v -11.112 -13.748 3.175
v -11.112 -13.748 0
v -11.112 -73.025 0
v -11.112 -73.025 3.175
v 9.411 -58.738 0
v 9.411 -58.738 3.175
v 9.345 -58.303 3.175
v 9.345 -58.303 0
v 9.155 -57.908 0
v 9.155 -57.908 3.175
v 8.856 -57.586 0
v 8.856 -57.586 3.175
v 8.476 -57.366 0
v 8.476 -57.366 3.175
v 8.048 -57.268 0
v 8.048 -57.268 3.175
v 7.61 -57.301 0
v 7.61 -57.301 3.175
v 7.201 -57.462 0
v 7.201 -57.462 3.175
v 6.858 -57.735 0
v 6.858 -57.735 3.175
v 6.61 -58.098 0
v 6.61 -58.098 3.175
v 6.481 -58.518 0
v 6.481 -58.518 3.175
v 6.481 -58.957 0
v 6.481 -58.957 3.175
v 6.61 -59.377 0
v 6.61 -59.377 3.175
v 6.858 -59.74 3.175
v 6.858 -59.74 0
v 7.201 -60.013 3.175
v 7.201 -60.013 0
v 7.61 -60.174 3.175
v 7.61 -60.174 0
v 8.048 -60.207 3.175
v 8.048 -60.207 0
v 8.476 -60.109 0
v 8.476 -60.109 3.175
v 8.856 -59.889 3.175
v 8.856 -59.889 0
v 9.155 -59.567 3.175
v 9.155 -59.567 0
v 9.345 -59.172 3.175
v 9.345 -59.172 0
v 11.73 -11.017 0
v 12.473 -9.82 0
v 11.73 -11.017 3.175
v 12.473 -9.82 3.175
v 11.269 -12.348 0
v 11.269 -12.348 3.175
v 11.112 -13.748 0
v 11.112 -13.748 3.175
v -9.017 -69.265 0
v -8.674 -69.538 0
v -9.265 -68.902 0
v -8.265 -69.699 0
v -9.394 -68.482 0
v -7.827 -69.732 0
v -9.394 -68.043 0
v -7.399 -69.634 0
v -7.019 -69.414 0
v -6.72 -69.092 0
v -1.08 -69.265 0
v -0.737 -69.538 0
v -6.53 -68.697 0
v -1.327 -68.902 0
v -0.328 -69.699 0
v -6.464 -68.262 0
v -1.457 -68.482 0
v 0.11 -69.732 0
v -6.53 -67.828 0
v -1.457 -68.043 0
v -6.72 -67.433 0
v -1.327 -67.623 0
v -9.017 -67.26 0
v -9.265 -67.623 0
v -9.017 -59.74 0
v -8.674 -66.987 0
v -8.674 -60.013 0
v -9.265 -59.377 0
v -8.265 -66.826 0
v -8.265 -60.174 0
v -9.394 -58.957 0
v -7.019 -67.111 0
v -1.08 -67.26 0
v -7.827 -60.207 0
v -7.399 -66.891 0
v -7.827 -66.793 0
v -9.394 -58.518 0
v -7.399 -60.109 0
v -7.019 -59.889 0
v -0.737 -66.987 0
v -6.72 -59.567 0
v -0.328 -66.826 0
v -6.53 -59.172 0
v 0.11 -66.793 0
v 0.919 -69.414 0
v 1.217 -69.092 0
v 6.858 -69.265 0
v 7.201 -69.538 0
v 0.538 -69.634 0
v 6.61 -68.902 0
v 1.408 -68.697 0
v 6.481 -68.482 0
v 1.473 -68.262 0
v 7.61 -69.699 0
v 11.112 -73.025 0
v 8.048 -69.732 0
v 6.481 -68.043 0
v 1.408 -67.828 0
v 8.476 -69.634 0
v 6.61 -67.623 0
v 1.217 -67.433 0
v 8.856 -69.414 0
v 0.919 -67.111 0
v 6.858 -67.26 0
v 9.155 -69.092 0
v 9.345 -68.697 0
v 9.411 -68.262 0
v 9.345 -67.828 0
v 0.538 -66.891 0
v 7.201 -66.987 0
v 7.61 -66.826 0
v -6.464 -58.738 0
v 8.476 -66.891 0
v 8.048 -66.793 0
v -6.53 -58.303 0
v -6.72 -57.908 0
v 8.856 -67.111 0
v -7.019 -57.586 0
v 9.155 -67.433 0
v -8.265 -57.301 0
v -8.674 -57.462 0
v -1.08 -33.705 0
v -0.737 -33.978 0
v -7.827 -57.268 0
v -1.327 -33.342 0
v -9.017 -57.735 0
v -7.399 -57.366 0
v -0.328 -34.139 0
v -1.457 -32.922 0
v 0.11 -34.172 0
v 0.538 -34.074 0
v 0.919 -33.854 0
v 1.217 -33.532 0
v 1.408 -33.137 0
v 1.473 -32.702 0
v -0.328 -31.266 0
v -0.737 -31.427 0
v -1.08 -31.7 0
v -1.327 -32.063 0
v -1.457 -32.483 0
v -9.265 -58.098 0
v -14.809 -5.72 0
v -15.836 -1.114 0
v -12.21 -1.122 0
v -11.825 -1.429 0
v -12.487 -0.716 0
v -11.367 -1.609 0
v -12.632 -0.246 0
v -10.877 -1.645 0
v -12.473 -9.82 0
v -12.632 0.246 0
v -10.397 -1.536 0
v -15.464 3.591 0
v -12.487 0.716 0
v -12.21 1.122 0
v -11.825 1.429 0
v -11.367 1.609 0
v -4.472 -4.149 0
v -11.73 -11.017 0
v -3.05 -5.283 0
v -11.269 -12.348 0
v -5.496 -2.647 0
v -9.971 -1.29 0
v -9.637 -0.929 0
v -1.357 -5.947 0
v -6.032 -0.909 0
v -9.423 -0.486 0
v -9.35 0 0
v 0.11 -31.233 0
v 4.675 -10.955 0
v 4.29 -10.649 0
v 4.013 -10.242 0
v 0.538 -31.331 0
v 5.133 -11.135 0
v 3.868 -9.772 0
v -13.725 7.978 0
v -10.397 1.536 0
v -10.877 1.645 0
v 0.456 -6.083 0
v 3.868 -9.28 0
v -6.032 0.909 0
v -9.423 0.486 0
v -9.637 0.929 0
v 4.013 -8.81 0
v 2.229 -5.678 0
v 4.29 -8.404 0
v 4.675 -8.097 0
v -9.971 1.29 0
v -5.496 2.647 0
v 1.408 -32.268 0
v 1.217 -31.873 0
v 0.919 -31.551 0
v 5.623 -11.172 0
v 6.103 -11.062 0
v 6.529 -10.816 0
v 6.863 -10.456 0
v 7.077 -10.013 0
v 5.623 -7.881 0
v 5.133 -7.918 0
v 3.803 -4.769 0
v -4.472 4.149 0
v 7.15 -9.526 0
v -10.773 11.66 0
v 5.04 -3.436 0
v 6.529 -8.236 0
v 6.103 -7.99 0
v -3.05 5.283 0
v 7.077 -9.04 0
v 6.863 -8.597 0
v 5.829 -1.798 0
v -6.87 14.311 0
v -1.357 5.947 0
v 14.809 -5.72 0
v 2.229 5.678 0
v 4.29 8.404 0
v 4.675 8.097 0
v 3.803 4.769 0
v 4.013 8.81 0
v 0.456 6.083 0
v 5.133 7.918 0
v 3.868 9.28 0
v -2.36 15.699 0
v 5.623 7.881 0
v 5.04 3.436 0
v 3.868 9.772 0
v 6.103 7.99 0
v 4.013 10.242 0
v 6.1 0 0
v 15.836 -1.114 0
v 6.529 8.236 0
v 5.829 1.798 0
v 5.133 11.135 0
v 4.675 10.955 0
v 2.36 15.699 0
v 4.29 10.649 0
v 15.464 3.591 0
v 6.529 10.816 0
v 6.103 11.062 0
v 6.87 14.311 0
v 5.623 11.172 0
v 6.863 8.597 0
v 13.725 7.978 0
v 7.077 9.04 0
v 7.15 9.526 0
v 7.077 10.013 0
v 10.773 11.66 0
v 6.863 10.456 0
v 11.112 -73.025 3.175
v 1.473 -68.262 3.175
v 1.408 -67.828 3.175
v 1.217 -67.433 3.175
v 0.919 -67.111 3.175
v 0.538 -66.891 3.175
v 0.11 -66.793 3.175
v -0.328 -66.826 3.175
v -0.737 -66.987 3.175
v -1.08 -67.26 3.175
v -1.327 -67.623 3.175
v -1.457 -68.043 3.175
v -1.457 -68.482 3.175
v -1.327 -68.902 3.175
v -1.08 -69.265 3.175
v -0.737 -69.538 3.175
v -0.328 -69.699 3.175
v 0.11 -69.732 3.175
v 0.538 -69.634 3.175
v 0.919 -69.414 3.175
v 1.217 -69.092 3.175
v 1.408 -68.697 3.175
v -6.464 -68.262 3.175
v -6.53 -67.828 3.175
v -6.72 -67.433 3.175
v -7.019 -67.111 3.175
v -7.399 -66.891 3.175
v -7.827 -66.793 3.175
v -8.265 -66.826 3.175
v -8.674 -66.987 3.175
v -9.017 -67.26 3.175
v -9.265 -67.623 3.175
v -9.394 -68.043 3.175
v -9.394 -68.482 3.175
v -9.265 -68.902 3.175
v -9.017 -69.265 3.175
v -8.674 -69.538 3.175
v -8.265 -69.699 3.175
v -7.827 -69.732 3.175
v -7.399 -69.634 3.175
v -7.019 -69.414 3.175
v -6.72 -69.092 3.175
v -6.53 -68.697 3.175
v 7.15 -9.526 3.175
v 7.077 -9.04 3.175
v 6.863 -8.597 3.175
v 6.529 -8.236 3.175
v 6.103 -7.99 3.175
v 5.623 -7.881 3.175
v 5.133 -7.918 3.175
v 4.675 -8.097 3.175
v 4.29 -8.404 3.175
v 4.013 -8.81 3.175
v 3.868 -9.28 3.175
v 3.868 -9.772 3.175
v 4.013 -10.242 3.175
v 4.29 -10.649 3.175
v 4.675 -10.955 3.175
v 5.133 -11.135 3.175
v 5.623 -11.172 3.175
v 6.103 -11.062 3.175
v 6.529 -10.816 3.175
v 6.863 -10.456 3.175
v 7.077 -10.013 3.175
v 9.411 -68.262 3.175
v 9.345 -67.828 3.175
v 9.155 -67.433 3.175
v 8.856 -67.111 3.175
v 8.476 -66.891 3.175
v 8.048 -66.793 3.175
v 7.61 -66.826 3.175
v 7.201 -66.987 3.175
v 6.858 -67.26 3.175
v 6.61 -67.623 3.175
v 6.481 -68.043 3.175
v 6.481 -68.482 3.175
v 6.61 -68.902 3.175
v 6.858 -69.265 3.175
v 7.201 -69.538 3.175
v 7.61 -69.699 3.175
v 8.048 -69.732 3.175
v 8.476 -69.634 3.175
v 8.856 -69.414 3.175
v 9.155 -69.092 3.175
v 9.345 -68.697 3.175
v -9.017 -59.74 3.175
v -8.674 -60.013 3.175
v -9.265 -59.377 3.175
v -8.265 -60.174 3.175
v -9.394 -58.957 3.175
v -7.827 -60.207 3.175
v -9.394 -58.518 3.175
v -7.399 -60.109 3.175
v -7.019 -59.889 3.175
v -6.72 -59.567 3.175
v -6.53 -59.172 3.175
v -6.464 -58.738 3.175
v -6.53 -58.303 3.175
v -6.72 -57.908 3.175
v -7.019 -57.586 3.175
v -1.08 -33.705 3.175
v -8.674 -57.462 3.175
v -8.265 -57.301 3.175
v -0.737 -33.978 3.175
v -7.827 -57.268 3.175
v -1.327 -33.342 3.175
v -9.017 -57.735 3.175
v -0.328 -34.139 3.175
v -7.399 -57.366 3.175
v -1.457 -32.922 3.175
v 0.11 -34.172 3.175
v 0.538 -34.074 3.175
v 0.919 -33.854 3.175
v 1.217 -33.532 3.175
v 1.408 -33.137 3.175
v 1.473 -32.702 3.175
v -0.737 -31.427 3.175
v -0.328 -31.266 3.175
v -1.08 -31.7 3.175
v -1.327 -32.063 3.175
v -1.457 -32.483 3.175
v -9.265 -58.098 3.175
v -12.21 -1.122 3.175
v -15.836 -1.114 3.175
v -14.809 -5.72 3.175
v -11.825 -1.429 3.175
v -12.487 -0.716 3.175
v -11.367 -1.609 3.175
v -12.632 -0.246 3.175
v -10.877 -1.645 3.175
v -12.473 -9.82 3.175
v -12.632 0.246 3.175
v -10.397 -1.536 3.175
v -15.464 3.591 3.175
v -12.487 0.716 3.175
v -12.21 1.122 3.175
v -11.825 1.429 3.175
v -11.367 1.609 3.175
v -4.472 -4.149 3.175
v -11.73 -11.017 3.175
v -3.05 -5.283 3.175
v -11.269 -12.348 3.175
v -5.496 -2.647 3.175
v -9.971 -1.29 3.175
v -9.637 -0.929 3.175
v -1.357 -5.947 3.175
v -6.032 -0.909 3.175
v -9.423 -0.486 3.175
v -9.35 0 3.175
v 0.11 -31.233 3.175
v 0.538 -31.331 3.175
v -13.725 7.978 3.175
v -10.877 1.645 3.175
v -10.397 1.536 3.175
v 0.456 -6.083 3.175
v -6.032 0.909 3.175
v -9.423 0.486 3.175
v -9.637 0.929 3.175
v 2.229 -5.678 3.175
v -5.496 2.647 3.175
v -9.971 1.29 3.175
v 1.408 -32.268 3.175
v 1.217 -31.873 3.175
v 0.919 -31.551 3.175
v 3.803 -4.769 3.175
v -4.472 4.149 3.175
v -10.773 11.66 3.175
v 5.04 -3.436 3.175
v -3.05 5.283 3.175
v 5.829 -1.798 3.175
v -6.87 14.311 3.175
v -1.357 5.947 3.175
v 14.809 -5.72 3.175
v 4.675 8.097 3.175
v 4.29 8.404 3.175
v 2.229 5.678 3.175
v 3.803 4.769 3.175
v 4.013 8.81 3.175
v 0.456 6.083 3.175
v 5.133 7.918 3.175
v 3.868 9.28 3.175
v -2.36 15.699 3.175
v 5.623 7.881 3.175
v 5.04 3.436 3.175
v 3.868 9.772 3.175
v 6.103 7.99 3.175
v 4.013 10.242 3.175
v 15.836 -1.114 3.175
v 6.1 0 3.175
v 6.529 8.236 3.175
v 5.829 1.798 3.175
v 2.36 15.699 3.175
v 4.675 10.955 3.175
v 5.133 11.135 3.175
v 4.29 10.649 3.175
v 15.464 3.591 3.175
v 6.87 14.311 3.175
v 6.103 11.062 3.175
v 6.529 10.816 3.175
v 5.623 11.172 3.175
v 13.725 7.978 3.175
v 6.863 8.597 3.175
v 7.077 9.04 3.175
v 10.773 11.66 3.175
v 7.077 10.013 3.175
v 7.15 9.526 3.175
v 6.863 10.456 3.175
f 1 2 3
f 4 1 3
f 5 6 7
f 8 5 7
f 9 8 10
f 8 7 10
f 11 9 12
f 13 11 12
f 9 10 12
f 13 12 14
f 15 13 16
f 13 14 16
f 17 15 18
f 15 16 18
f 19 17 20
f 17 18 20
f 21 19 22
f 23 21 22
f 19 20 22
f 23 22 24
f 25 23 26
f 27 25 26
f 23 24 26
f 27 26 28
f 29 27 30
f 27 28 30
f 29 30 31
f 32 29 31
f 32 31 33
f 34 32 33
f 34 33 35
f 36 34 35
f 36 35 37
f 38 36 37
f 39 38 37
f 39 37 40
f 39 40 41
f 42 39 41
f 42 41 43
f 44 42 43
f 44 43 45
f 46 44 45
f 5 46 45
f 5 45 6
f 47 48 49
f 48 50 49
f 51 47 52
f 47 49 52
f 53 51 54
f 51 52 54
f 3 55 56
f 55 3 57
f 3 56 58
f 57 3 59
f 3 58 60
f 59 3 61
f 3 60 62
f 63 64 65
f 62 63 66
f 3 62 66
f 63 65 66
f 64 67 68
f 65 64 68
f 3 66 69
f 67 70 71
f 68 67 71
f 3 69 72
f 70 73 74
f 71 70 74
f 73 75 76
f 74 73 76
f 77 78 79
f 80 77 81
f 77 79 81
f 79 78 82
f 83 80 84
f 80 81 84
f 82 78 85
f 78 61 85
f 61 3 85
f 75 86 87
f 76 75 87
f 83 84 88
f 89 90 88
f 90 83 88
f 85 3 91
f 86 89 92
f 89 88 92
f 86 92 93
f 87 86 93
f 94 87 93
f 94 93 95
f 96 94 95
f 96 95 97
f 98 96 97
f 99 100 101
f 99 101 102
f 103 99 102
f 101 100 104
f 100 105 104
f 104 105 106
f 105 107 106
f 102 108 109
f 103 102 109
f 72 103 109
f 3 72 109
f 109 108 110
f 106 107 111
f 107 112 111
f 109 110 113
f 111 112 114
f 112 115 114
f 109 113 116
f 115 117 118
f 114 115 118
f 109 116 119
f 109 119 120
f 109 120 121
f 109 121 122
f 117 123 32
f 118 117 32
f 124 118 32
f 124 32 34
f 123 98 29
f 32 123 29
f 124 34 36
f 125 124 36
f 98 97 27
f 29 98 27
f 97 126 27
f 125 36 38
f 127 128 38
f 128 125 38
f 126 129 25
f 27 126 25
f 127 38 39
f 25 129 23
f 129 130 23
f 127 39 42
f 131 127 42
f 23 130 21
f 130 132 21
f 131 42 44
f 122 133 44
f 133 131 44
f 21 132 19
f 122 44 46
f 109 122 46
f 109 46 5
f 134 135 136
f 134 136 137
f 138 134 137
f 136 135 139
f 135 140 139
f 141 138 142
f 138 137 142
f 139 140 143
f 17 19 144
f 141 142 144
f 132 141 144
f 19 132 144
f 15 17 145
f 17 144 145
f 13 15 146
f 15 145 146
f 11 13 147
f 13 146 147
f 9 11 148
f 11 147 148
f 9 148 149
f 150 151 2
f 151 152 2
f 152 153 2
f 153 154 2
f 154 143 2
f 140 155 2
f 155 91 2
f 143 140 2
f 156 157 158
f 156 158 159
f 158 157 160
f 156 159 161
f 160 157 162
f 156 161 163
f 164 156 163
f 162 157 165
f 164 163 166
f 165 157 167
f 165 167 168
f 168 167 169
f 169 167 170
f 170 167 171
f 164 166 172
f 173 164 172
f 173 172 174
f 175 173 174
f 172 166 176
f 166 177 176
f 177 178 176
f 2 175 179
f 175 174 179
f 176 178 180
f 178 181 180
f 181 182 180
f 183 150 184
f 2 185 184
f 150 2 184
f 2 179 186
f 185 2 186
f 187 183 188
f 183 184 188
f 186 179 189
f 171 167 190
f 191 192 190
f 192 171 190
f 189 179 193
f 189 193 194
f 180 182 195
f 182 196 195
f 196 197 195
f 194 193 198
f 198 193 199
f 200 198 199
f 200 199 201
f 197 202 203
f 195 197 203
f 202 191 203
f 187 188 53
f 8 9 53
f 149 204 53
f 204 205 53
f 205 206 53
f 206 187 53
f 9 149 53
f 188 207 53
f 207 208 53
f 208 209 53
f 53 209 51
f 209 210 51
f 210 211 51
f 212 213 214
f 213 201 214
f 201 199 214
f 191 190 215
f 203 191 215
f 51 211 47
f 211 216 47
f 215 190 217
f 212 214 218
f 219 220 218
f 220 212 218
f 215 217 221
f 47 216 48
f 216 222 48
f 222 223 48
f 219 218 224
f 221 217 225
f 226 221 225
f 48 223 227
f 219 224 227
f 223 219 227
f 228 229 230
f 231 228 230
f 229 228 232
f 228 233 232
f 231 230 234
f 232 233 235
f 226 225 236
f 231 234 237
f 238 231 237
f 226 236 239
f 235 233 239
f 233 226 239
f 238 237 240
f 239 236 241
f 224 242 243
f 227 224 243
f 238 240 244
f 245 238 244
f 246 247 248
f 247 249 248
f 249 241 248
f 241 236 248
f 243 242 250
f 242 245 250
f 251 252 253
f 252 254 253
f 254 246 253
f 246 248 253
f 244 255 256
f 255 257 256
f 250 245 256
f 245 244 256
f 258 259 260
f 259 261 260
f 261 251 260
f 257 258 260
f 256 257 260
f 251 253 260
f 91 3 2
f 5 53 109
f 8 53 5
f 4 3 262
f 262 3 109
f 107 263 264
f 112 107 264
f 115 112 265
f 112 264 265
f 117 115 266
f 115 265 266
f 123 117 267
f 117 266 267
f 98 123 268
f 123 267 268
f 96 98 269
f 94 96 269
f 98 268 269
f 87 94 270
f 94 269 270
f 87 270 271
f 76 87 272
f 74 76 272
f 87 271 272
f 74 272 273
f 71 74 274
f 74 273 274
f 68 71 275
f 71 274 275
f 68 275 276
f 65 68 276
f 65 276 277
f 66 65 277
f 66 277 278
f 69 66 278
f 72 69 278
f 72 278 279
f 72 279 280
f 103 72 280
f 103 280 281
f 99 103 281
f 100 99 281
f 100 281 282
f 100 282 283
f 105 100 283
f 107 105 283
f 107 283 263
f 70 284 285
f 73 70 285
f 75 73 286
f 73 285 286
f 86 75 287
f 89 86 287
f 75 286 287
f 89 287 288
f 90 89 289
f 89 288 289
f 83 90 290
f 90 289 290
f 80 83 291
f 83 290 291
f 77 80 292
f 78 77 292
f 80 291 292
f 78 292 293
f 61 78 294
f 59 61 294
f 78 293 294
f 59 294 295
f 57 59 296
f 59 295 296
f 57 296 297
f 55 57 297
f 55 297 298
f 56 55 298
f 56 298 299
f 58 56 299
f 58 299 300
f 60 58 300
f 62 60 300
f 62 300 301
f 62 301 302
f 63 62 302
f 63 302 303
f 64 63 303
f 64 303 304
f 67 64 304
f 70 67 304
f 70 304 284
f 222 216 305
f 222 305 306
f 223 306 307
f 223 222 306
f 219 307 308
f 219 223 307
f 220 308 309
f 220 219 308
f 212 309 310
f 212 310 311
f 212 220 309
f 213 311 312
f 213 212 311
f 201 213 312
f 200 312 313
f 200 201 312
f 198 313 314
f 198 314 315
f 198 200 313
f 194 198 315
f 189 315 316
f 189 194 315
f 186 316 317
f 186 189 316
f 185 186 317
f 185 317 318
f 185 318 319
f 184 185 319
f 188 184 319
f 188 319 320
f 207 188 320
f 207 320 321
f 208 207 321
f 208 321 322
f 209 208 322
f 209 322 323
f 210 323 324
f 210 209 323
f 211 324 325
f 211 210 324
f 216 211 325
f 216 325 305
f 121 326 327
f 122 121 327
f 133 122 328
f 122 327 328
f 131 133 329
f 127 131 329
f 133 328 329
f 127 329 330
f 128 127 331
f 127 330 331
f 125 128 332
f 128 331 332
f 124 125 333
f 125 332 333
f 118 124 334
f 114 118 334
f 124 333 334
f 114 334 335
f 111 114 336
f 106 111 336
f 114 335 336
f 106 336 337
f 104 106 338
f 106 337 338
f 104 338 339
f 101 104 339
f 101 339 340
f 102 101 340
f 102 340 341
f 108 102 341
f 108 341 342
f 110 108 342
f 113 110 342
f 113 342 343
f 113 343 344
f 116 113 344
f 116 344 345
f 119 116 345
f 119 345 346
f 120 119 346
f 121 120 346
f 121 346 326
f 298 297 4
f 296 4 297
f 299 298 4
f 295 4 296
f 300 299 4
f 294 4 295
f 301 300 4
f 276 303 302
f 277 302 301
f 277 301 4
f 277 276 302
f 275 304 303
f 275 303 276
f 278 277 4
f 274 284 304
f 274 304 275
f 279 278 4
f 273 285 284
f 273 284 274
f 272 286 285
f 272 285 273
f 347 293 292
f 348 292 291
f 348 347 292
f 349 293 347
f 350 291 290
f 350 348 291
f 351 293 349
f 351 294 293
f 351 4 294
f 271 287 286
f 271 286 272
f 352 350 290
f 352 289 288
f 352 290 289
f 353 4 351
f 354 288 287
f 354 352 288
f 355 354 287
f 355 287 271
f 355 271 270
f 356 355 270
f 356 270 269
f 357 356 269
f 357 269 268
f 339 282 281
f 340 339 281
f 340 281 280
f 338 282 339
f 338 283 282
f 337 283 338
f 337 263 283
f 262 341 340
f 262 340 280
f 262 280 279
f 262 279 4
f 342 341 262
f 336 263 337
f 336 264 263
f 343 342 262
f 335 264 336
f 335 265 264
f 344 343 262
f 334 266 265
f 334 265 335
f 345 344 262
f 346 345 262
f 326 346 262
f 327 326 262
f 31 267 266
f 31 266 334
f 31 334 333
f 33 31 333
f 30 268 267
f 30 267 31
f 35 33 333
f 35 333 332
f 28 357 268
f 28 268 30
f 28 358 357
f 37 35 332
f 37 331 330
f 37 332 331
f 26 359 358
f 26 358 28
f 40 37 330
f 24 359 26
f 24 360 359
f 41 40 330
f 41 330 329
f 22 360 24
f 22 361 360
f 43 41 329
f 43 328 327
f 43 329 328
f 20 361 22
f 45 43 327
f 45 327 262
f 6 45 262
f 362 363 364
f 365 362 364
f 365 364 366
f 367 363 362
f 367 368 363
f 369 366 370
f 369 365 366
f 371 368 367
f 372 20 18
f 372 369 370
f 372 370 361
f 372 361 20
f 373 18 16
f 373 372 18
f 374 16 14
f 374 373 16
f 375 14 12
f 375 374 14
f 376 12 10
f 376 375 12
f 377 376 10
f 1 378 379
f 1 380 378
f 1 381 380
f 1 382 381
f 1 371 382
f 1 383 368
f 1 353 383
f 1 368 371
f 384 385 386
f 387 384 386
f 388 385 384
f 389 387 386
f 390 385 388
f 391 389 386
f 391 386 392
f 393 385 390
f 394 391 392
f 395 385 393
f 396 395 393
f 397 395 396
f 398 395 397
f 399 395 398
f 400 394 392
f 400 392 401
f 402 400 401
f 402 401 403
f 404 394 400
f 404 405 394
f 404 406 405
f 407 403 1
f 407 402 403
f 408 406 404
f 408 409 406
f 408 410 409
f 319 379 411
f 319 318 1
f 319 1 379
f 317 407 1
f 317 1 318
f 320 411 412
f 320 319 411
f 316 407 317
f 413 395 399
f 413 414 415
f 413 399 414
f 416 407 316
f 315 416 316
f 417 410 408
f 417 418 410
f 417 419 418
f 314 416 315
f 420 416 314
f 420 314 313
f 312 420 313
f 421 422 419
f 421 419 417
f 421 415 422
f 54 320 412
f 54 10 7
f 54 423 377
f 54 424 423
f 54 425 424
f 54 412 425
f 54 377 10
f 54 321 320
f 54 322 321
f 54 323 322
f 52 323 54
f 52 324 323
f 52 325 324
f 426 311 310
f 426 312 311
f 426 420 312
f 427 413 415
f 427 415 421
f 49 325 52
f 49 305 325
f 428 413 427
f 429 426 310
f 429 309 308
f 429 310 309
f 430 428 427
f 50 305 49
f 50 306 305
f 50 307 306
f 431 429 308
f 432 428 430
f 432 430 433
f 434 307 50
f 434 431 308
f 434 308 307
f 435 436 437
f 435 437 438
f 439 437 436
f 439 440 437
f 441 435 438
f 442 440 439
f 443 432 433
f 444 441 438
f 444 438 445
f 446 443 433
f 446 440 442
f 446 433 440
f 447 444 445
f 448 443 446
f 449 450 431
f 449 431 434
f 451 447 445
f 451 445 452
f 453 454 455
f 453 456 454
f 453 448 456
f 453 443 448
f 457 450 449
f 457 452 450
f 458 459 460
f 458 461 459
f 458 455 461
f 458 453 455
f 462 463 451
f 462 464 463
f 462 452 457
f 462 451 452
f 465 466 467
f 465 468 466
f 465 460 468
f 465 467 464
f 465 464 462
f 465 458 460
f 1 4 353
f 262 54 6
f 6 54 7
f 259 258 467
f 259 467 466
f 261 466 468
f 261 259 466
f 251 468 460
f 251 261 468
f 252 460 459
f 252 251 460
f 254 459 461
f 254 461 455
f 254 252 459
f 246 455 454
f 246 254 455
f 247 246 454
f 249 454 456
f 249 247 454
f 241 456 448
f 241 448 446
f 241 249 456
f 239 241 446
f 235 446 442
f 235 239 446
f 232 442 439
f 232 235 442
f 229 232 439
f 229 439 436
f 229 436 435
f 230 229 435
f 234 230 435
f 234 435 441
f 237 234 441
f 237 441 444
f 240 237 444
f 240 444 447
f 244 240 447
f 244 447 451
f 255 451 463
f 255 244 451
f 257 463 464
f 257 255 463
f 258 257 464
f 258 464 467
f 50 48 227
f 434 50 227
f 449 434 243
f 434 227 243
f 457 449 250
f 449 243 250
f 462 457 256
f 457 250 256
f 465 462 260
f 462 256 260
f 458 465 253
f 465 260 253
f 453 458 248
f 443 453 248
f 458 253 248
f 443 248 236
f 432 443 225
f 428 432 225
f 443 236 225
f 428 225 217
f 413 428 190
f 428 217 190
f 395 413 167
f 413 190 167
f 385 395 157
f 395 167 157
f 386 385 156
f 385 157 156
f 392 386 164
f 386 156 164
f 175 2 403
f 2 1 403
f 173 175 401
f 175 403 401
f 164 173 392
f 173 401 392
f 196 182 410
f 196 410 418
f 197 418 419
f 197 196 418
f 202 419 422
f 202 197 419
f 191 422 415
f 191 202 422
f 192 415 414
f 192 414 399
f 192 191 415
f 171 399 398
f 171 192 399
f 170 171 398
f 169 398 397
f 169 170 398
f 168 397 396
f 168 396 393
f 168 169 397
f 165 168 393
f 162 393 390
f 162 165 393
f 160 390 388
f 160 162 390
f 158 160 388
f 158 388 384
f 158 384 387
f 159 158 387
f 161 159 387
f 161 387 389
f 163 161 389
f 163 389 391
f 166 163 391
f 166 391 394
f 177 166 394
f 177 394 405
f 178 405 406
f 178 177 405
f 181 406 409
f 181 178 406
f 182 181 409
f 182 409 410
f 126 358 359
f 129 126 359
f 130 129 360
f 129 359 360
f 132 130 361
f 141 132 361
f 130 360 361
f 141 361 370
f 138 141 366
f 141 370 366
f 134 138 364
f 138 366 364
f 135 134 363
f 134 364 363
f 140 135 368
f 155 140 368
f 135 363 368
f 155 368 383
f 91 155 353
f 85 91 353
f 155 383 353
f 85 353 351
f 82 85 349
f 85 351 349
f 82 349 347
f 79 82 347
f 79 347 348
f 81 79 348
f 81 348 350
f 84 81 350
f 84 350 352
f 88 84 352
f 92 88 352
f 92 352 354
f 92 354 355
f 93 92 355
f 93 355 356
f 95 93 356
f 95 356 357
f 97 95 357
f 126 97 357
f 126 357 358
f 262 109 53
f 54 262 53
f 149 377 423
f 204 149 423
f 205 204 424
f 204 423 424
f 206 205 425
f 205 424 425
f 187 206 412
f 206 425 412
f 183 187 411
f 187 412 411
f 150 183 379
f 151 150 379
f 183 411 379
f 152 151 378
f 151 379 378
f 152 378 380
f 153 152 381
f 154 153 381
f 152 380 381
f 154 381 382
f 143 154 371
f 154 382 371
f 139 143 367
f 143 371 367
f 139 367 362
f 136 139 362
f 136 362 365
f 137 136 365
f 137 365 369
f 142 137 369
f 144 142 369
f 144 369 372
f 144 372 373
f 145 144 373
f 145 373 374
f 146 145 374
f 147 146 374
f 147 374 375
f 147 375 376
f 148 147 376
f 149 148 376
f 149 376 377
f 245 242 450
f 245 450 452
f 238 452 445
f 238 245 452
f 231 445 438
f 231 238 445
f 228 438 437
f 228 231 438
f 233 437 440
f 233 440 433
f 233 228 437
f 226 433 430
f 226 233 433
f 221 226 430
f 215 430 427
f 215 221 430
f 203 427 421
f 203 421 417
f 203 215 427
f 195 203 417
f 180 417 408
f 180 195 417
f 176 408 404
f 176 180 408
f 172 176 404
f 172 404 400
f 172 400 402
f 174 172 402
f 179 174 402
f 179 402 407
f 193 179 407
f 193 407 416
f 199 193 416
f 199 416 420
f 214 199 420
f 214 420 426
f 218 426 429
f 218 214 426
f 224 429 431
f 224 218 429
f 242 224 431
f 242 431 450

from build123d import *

# Parameters (mm, degrees)
SKETCH1_R                 = 1.65
SKETCH1_R_2               = 6.1
BOSS_EXTRUDE1_DEPTH       = 3.175
F_4_CLEARANCE_HOLE2_D     = 2.9464
F_4_CLEARANCE_HOLE2_DEPTH = 9.906
F_4_CLEARANCE_HOLE2_TIP   = 0.885187864
F_4_CLEARANCE_HOLE1_D     = 2.9464
FILLET1_R                 = 6.35


with BuildPart() as part:
    # Sketch1 → Boss-Extrude1 (new body)
    with BuildSketch(Plane.XY):
        with BuildLine():
            Line((-11.1125, -11.33701763), (-11.1125, -73.025))
            Line((-11.1125, -73.025), (11.1125, -73.025))
            Line((11.1125, -73.025), (11.1125, -11.33701763))
            ThreePointArc((11.1125, -11.33701763), (0, 15.875), (-11.1125, -11.33701763))
        make_face()
        with Locations((-11, 0)):
            Circle(SKETCH1_R, mode=Mode.SUBTRACT)
        with Locations((5.5, 9.526279442)):
            Circle(SKETCH1_R, mode=Mode.SUBTRACT)
        with Locations((5.5, -9.526279442)):
            Circle(SKETCH1_R, mode=Mode.SUBTRACT)
        Circle(SKETCH1_R_2, mode=Mode.SUBTRACT)
    extrude(amount=BOSS_EXTRUDE1_DEPTH)

    # #4 Clearance Hole2
    with Locations(Plane(origin=(0, 0, 0), x_dir=(-1, 0, 0), z_dir=(0, 0, -1))):
        with Locations((7.9375, -68.2625), (-7.9375, -68.2625), (-7.9375, -58.7375), (7.9375, -58.7375)):
            Hole(F_4_CLEARANCE_HOLE2_D / 2, depth=F_4_CLEARANCE_HOLE2_DEPTH)
            with Locations((0, 0, -(F_4_CLEARANCE_HOLE2_DEPTH + F_4_CLEARANCE_HOLE2_TIP / 2))):  # 118° drill point
                Cone(0, F_4_CLEARANCE_HOLE2_D / 2, F_4_CLEARANCE_HOLE2_TIP, mode=Mode.SUBTRACT)

    # #4 Clearance Hole1 (through all)
    with Locations(Plane(origin=(0, 0, 0), x_dir=(-1, 0, 0), z_dir=(0, 0, -1))):
        with Locations((0, -68.2625), (0, -32.7025)):
            Hole(F_4_CLEARANCE_HOLE1_D / 2)

    # Fillet1
    fillet1_edges = [part.edges().sort_by_distance(p)[0] for p in [
        (11.1125, -11.33701763, 1.5875),
        (-11.1125, -11.33701763, 1.5875),
    ]]
    fillet(fillet1_edges, radius=FILLET1_R)


solid = part.part
